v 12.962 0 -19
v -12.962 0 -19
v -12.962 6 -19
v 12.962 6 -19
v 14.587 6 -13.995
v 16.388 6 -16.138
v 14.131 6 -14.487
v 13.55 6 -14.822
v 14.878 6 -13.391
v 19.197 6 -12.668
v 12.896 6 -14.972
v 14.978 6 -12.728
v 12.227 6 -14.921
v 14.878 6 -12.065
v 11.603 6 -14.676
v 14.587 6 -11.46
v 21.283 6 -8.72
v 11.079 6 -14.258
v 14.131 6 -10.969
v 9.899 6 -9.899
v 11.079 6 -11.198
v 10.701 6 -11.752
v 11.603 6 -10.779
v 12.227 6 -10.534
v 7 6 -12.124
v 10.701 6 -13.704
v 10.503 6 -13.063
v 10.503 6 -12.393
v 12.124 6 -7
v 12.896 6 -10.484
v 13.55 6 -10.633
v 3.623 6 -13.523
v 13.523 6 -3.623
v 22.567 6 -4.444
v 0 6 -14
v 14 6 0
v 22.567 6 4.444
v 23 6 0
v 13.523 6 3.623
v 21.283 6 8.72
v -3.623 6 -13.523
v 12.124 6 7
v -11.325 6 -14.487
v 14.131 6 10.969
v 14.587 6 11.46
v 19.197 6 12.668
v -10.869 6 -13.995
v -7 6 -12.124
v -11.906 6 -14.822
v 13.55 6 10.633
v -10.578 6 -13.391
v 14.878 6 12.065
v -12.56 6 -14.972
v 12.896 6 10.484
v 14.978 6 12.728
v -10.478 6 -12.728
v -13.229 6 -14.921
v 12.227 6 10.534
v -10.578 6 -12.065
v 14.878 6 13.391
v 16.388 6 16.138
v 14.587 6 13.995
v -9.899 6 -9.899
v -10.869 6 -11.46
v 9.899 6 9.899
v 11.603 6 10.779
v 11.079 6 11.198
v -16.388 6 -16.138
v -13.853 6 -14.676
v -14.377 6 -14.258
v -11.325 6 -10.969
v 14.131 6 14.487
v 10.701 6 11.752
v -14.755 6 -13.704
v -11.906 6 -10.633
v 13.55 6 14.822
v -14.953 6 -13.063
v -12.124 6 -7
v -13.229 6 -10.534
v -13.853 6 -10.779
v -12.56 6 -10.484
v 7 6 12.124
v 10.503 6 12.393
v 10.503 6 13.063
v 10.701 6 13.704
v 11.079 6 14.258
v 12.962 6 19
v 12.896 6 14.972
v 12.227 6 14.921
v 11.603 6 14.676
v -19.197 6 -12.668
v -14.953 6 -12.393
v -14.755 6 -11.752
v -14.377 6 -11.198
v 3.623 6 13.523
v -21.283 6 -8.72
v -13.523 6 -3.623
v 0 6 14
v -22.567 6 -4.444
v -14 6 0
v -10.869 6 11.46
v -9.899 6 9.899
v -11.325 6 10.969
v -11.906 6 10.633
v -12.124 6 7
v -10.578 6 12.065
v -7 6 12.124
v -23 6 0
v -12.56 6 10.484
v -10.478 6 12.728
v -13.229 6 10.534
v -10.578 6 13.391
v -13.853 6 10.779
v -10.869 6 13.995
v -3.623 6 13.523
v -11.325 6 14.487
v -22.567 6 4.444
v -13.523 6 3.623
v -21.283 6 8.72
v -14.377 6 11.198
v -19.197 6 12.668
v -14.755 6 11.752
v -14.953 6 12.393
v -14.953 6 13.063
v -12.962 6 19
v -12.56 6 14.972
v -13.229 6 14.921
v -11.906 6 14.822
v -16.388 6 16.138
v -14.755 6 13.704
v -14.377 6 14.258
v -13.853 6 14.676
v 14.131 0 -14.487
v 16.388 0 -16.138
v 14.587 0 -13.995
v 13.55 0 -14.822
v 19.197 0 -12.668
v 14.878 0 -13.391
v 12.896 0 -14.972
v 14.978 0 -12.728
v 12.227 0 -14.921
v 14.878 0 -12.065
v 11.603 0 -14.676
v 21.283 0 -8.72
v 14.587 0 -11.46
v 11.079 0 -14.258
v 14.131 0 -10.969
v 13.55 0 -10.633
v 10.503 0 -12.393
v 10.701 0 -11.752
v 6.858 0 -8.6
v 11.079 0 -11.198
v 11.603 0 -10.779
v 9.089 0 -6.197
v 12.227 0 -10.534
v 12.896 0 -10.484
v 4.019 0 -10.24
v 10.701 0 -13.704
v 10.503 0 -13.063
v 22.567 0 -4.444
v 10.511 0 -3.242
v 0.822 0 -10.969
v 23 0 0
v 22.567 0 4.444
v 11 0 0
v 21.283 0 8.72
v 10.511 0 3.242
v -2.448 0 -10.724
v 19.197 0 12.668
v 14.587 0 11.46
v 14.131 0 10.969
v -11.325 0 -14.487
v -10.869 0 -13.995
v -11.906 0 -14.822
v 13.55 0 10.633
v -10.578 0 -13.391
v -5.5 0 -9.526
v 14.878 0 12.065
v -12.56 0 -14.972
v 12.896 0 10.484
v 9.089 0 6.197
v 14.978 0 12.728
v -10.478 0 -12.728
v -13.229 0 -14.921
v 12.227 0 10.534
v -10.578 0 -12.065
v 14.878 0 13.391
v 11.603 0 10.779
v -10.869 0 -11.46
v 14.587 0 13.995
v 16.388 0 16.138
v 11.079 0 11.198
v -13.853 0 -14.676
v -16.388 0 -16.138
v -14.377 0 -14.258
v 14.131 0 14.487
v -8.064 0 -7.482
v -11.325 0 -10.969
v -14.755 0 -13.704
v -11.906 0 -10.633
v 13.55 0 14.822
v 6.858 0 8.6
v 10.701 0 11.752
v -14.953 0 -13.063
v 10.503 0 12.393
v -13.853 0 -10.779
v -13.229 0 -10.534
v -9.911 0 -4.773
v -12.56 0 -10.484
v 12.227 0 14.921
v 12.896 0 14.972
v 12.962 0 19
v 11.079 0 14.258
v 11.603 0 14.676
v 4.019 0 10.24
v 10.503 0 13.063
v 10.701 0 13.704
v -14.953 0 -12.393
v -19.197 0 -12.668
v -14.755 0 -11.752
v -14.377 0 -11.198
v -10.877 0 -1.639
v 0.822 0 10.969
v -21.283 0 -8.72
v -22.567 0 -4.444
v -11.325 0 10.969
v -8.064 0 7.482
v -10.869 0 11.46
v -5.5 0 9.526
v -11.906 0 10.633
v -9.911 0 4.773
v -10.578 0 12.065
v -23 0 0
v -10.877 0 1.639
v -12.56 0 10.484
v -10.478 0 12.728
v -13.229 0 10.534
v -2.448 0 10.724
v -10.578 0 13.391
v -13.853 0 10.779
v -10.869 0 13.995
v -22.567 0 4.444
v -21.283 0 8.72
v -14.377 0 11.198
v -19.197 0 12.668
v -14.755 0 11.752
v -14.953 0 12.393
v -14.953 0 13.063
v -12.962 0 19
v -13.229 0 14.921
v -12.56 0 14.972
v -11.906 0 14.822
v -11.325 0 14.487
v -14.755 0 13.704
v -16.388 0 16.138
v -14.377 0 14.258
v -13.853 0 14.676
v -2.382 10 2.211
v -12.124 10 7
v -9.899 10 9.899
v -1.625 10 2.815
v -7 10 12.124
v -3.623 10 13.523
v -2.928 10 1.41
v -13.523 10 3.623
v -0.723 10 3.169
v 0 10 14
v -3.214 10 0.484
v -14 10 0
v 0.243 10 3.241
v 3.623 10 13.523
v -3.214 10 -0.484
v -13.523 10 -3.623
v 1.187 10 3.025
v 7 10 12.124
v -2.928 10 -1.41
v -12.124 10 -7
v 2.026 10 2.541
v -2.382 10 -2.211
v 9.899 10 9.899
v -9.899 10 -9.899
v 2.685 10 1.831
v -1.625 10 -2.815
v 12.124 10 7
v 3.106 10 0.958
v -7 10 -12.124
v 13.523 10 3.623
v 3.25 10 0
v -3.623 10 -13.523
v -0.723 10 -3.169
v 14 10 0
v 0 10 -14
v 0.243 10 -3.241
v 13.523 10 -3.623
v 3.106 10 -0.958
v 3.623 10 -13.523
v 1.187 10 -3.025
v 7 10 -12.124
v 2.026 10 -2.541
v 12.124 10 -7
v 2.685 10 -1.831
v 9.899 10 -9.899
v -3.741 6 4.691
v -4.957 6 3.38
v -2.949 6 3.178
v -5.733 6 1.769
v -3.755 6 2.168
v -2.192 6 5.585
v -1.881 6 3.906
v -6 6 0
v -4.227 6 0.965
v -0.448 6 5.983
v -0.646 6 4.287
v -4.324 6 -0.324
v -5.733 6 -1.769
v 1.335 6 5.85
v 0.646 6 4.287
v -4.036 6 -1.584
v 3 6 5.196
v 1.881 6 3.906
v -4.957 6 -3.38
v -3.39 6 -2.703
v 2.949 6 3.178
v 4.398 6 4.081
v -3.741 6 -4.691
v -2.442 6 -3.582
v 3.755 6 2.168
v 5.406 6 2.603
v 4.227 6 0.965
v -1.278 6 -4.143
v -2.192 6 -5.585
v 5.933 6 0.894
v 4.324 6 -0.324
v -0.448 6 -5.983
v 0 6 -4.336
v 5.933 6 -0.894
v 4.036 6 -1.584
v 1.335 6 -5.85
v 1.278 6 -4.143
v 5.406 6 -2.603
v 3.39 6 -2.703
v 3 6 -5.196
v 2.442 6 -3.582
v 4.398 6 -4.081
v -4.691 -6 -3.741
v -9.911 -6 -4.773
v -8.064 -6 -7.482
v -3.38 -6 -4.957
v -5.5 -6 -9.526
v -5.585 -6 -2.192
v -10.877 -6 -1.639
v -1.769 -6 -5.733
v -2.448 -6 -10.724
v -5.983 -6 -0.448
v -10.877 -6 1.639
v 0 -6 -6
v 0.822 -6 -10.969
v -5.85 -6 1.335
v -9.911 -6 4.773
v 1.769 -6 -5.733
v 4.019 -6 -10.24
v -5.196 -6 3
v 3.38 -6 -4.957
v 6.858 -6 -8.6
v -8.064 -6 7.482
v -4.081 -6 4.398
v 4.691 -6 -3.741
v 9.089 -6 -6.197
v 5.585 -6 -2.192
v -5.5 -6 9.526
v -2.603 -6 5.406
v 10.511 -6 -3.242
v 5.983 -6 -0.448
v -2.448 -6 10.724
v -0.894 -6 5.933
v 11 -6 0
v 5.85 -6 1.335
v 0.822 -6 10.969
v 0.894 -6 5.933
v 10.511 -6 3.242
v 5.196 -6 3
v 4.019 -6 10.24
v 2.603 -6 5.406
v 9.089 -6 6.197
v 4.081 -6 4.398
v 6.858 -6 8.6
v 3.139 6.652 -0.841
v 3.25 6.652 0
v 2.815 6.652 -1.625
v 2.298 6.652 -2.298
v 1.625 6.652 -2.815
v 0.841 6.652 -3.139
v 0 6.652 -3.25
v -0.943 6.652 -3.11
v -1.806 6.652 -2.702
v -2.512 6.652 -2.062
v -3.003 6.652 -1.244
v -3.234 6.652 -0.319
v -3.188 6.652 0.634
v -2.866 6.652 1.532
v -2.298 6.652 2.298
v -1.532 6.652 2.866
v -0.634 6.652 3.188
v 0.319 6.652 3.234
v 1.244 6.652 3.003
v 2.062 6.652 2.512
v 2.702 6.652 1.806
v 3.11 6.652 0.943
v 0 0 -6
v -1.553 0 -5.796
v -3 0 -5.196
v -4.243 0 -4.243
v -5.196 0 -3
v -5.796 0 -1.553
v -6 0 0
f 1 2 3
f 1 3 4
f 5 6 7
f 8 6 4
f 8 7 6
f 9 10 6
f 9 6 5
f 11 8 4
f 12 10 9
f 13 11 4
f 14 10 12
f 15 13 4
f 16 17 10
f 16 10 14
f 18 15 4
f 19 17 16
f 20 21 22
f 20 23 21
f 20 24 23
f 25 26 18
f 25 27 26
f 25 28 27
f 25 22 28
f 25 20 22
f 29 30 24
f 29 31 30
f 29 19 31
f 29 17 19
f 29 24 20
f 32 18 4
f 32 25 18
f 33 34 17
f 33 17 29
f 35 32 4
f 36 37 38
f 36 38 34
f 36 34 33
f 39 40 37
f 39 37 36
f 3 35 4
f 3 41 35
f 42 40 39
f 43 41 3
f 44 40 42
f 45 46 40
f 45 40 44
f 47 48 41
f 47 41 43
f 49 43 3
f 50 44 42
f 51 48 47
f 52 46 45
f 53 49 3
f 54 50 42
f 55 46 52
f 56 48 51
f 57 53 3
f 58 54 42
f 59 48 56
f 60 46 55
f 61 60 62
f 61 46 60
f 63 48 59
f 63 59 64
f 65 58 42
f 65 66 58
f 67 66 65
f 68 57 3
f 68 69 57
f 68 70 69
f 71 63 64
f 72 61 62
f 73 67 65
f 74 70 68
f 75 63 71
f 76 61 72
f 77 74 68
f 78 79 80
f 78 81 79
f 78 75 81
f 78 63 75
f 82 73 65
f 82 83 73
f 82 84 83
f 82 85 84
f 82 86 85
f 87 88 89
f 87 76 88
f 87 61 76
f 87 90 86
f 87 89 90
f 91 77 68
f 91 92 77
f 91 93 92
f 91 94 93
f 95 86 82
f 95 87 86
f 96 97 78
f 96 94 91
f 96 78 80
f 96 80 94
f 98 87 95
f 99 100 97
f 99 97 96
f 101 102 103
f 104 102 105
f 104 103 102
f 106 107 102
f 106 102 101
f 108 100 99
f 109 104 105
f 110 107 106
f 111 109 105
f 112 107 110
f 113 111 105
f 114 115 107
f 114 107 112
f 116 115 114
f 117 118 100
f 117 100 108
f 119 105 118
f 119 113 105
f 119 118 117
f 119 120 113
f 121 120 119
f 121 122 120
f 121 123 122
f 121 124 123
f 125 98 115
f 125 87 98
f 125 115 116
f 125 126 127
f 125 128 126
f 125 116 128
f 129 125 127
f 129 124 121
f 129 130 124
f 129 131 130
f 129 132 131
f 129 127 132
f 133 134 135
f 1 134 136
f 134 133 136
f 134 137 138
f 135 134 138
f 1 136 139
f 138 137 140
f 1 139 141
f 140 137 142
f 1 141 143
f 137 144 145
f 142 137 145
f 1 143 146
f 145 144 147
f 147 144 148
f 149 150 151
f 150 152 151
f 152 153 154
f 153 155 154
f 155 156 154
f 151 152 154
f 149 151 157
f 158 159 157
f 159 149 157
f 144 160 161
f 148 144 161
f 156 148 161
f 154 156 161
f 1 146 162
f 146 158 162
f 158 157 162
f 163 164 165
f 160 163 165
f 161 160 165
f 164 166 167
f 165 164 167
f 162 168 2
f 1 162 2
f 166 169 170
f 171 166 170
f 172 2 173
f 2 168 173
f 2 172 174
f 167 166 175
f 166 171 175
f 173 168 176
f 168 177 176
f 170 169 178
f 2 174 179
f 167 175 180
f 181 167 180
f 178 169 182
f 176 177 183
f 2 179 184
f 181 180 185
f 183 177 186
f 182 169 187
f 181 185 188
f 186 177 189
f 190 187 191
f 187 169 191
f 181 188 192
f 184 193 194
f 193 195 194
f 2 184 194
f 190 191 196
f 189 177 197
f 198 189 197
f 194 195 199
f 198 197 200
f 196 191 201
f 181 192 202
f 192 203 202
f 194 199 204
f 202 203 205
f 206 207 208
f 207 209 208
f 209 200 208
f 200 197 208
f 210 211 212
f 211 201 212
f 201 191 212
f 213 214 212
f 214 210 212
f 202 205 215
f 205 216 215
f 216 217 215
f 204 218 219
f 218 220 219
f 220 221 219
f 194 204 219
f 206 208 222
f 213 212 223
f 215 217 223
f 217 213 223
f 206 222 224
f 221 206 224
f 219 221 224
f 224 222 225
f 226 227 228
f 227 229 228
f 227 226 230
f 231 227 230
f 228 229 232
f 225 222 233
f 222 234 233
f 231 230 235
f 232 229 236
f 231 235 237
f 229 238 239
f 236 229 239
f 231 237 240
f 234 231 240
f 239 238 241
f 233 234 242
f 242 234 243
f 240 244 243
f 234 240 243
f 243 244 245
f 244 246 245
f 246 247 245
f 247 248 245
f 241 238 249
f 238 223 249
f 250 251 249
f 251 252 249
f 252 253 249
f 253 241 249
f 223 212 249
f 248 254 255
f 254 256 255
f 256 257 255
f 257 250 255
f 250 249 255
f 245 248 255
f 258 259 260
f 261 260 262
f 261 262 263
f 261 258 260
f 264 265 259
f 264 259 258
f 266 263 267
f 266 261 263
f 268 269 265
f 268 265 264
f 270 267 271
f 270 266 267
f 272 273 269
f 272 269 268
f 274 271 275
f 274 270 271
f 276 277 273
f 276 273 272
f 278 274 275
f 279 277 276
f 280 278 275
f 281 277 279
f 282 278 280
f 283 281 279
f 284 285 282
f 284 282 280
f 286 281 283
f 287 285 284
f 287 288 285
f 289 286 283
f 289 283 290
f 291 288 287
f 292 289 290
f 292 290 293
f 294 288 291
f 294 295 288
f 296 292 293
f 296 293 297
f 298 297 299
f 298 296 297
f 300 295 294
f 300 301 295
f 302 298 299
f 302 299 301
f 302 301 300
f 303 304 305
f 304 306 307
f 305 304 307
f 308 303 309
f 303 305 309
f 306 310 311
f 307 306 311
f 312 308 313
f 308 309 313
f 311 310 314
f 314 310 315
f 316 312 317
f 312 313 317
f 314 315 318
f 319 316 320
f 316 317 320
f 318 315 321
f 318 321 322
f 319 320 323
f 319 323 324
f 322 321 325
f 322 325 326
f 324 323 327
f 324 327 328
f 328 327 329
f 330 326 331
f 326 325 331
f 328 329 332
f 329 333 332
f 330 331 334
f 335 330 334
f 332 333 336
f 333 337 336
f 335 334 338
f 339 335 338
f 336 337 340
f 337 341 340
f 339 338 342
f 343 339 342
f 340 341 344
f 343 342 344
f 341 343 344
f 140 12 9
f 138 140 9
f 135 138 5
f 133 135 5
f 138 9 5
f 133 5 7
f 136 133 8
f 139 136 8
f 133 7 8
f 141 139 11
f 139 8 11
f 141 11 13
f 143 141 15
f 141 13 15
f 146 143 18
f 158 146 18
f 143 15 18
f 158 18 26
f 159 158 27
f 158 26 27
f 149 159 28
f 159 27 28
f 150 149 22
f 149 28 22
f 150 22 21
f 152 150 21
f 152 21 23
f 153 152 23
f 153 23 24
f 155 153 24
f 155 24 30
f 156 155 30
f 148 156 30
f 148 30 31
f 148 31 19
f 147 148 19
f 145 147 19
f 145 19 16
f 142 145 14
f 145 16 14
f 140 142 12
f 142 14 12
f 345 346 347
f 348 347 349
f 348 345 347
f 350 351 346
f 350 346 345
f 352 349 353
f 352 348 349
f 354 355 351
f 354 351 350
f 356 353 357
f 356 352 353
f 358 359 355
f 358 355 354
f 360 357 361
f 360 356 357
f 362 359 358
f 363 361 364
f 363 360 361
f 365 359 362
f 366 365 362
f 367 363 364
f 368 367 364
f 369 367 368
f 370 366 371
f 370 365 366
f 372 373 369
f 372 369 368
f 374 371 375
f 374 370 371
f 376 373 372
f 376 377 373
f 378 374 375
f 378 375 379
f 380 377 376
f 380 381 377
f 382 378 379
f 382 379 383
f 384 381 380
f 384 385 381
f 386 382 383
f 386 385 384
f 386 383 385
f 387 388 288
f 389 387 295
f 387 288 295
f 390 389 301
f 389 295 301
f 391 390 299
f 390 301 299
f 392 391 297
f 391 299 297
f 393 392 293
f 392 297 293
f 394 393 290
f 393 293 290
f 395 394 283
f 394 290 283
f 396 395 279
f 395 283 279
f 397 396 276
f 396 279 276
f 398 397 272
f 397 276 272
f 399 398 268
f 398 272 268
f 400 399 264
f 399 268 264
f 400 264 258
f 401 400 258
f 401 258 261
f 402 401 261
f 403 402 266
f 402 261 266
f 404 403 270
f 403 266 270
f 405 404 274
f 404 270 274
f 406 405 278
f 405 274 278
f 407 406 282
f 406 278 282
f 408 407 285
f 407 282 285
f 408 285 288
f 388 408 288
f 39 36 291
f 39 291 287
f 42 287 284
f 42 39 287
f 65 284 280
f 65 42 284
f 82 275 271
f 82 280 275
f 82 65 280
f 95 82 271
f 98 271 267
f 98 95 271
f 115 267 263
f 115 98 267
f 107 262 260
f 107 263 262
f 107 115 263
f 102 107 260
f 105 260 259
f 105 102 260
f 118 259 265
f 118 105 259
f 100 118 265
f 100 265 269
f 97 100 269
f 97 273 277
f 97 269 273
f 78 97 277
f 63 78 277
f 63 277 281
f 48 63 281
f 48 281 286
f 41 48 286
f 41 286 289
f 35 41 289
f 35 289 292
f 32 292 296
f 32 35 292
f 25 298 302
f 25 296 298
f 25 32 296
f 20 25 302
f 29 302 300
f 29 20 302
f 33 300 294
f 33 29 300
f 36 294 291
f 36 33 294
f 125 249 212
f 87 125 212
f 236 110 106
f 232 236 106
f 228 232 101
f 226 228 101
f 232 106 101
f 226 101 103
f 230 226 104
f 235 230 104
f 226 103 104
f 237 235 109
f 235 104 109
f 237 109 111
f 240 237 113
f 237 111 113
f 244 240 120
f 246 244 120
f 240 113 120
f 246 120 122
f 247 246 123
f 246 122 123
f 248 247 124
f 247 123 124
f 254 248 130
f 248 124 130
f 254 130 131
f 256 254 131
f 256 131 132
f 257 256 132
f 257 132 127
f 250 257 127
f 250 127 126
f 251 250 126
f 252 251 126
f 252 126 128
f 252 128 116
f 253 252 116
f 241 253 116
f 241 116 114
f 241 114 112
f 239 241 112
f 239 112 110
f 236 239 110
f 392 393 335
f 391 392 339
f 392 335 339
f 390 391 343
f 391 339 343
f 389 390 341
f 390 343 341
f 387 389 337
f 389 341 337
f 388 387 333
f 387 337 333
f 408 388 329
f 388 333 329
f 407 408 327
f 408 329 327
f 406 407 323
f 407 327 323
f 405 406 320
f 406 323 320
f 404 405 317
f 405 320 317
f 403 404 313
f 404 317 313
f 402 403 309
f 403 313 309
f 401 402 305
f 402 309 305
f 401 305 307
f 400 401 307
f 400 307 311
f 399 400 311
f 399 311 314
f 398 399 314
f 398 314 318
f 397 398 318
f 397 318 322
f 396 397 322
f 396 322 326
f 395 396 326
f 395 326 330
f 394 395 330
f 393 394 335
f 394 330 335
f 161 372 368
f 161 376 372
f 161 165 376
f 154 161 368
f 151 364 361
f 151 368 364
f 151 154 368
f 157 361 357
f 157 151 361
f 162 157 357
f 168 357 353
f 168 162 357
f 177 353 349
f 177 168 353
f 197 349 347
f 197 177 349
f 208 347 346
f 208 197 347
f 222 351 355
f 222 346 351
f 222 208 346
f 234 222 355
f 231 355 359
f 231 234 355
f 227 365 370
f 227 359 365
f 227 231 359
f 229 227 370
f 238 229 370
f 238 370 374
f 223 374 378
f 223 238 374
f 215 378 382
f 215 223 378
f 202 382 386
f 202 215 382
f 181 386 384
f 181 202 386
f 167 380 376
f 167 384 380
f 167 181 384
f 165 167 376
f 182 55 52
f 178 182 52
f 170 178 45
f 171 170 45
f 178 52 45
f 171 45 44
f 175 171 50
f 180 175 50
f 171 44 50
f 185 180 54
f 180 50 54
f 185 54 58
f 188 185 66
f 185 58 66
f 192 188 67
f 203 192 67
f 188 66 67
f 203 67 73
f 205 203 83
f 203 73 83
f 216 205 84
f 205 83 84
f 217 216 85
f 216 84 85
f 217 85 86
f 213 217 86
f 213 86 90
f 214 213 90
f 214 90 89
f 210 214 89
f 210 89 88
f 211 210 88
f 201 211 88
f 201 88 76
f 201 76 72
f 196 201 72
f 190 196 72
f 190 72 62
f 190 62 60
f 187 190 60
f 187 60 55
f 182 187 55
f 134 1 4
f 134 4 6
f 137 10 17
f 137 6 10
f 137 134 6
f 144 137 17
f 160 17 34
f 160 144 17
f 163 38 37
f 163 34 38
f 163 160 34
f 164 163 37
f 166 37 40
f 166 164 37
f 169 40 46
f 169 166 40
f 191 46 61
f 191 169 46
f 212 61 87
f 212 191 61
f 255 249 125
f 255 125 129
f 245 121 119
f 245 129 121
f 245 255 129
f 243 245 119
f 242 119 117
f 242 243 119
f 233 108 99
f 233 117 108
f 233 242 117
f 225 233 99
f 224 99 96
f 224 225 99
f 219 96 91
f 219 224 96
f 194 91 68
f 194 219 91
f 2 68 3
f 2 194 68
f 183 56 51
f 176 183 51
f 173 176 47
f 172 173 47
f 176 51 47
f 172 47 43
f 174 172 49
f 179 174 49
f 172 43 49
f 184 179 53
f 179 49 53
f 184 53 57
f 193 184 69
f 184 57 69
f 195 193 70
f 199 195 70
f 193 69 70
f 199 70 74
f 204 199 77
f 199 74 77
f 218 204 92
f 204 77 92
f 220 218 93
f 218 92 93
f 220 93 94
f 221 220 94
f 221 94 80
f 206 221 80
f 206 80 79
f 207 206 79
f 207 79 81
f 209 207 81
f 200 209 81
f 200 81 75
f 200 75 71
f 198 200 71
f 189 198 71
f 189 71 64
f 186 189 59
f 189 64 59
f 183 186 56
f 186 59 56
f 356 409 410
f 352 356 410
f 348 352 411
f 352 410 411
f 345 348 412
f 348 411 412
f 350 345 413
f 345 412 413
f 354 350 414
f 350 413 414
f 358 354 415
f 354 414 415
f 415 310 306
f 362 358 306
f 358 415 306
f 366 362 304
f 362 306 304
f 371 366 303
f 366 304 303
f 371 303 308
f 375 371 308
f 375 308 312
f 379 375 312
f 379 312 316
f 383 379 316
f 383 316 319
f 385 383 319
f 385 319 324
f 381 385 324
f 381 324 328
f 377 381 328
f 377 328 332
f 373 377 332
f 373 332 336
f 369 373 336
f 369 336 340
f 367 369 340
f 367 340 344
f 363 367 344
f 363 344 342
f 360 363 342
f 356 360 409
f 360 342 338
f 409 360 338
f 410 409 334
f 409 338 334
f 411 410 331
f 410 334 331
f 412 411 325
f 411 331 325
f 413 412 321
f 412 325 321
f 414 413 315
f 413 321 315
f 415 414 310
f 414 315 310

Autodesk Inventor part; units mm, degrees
ref_plane "YZ Plane" through (0, 0, 0) normal (1, 0, 0) x (0, 1, 0)
ref_plane "XZ Plane" through (0, 0, 0) normal (0, 1, 0) x (-1, 0, 0)
ref_plane "XY Plane" through (0, 0, 0) normal (0, 0, 1) x (1, 0, 0)
sketch "Sketch1" plane through (0, 0, 0) normal (0, 1, 0) x (-1, 0, 0)
  line L0 (0, -19) -> (0, 19) construction
  line L1 (12.9615, 19) -> (-12.9615, 19)
  line L2 (12.9615, -19) -> (-12.9615, -19)
  arc A0 (-12.9615, 19) -> (-12.9615, -19) centre (0, 0) ccw
  arc A1 (12.9615, -19) -> (12.9615, 19) centre (0, 0) ccw
  circle A2 centre (0, 0) radius 6
  dimension "d3" = 12
extrude "Extrusion1" add sketch "Sketch1" along normal blind 6
sketch "Sketch2" plane through (0, 6, 0) normal (0, 1, 0) x (1, 0, 0)
  circle A0 centre (0, 0) radius 14
  dimension "d6" = 28
extrude "Extrusion2" add sketch "Sketch2" along normal blind 4
sketch "Sketch3" plane through (0, 0, 0) normal (0, -1, 0) x (1, 0, 0)
  circle A0 centre (0, 0) radius 11
  dimension "d9" = 22
extrude "Extrusion3" add sketch "Sketch3" along normal blind 6
sketch "Sketch4" plane through (0, -6, 0) normal (0, -1, 0) x (1, 0, 0)
  circle A0 centre (0, 0) radius 6
hole "Hole1" at (0, -6, 0) direction (0, 1, 0) diameter 12 depth 11 tip angle 118
sketch "Sketch5" plane through (0, 10, 0) normal (0, 1, 0) x (1, 0, 0)
  circle A0 centre (0, 0) radius 3.25
  dimension "d19" = 6.5
extrude "Extrusion4" cut sketch "Sketch5" against normal through all
sketch "Sketch6" plane through (0, 6, 0) normal (0, 1, 0) x (1, 0, 0)
  circle A0 centre (0, 0) radius 18 construction
  line L0 (0, 0) -> (12.7279, -12.7279) construction
  line L1 (0, 0) -> (18, 0) construction
  circle A1 centre (12.7279, -12.7279) radius 2.25
  circle A2 centre (12.7279, 12.7279) radius 2.25
  circle A3 centre (-12.7279, 12.7279) radius 2.25
  circle A4 centre (-12.7279, -12.7279) radius 2.25
  dimension "d22" = 36
  dimension "d23" = 45
  dimension "d24" = 4.5
  dimension "d27" = 360
extrude "Extrusion5" cut sketch "Sketch6" against normal through all
properties part number "Testata Superiore"
